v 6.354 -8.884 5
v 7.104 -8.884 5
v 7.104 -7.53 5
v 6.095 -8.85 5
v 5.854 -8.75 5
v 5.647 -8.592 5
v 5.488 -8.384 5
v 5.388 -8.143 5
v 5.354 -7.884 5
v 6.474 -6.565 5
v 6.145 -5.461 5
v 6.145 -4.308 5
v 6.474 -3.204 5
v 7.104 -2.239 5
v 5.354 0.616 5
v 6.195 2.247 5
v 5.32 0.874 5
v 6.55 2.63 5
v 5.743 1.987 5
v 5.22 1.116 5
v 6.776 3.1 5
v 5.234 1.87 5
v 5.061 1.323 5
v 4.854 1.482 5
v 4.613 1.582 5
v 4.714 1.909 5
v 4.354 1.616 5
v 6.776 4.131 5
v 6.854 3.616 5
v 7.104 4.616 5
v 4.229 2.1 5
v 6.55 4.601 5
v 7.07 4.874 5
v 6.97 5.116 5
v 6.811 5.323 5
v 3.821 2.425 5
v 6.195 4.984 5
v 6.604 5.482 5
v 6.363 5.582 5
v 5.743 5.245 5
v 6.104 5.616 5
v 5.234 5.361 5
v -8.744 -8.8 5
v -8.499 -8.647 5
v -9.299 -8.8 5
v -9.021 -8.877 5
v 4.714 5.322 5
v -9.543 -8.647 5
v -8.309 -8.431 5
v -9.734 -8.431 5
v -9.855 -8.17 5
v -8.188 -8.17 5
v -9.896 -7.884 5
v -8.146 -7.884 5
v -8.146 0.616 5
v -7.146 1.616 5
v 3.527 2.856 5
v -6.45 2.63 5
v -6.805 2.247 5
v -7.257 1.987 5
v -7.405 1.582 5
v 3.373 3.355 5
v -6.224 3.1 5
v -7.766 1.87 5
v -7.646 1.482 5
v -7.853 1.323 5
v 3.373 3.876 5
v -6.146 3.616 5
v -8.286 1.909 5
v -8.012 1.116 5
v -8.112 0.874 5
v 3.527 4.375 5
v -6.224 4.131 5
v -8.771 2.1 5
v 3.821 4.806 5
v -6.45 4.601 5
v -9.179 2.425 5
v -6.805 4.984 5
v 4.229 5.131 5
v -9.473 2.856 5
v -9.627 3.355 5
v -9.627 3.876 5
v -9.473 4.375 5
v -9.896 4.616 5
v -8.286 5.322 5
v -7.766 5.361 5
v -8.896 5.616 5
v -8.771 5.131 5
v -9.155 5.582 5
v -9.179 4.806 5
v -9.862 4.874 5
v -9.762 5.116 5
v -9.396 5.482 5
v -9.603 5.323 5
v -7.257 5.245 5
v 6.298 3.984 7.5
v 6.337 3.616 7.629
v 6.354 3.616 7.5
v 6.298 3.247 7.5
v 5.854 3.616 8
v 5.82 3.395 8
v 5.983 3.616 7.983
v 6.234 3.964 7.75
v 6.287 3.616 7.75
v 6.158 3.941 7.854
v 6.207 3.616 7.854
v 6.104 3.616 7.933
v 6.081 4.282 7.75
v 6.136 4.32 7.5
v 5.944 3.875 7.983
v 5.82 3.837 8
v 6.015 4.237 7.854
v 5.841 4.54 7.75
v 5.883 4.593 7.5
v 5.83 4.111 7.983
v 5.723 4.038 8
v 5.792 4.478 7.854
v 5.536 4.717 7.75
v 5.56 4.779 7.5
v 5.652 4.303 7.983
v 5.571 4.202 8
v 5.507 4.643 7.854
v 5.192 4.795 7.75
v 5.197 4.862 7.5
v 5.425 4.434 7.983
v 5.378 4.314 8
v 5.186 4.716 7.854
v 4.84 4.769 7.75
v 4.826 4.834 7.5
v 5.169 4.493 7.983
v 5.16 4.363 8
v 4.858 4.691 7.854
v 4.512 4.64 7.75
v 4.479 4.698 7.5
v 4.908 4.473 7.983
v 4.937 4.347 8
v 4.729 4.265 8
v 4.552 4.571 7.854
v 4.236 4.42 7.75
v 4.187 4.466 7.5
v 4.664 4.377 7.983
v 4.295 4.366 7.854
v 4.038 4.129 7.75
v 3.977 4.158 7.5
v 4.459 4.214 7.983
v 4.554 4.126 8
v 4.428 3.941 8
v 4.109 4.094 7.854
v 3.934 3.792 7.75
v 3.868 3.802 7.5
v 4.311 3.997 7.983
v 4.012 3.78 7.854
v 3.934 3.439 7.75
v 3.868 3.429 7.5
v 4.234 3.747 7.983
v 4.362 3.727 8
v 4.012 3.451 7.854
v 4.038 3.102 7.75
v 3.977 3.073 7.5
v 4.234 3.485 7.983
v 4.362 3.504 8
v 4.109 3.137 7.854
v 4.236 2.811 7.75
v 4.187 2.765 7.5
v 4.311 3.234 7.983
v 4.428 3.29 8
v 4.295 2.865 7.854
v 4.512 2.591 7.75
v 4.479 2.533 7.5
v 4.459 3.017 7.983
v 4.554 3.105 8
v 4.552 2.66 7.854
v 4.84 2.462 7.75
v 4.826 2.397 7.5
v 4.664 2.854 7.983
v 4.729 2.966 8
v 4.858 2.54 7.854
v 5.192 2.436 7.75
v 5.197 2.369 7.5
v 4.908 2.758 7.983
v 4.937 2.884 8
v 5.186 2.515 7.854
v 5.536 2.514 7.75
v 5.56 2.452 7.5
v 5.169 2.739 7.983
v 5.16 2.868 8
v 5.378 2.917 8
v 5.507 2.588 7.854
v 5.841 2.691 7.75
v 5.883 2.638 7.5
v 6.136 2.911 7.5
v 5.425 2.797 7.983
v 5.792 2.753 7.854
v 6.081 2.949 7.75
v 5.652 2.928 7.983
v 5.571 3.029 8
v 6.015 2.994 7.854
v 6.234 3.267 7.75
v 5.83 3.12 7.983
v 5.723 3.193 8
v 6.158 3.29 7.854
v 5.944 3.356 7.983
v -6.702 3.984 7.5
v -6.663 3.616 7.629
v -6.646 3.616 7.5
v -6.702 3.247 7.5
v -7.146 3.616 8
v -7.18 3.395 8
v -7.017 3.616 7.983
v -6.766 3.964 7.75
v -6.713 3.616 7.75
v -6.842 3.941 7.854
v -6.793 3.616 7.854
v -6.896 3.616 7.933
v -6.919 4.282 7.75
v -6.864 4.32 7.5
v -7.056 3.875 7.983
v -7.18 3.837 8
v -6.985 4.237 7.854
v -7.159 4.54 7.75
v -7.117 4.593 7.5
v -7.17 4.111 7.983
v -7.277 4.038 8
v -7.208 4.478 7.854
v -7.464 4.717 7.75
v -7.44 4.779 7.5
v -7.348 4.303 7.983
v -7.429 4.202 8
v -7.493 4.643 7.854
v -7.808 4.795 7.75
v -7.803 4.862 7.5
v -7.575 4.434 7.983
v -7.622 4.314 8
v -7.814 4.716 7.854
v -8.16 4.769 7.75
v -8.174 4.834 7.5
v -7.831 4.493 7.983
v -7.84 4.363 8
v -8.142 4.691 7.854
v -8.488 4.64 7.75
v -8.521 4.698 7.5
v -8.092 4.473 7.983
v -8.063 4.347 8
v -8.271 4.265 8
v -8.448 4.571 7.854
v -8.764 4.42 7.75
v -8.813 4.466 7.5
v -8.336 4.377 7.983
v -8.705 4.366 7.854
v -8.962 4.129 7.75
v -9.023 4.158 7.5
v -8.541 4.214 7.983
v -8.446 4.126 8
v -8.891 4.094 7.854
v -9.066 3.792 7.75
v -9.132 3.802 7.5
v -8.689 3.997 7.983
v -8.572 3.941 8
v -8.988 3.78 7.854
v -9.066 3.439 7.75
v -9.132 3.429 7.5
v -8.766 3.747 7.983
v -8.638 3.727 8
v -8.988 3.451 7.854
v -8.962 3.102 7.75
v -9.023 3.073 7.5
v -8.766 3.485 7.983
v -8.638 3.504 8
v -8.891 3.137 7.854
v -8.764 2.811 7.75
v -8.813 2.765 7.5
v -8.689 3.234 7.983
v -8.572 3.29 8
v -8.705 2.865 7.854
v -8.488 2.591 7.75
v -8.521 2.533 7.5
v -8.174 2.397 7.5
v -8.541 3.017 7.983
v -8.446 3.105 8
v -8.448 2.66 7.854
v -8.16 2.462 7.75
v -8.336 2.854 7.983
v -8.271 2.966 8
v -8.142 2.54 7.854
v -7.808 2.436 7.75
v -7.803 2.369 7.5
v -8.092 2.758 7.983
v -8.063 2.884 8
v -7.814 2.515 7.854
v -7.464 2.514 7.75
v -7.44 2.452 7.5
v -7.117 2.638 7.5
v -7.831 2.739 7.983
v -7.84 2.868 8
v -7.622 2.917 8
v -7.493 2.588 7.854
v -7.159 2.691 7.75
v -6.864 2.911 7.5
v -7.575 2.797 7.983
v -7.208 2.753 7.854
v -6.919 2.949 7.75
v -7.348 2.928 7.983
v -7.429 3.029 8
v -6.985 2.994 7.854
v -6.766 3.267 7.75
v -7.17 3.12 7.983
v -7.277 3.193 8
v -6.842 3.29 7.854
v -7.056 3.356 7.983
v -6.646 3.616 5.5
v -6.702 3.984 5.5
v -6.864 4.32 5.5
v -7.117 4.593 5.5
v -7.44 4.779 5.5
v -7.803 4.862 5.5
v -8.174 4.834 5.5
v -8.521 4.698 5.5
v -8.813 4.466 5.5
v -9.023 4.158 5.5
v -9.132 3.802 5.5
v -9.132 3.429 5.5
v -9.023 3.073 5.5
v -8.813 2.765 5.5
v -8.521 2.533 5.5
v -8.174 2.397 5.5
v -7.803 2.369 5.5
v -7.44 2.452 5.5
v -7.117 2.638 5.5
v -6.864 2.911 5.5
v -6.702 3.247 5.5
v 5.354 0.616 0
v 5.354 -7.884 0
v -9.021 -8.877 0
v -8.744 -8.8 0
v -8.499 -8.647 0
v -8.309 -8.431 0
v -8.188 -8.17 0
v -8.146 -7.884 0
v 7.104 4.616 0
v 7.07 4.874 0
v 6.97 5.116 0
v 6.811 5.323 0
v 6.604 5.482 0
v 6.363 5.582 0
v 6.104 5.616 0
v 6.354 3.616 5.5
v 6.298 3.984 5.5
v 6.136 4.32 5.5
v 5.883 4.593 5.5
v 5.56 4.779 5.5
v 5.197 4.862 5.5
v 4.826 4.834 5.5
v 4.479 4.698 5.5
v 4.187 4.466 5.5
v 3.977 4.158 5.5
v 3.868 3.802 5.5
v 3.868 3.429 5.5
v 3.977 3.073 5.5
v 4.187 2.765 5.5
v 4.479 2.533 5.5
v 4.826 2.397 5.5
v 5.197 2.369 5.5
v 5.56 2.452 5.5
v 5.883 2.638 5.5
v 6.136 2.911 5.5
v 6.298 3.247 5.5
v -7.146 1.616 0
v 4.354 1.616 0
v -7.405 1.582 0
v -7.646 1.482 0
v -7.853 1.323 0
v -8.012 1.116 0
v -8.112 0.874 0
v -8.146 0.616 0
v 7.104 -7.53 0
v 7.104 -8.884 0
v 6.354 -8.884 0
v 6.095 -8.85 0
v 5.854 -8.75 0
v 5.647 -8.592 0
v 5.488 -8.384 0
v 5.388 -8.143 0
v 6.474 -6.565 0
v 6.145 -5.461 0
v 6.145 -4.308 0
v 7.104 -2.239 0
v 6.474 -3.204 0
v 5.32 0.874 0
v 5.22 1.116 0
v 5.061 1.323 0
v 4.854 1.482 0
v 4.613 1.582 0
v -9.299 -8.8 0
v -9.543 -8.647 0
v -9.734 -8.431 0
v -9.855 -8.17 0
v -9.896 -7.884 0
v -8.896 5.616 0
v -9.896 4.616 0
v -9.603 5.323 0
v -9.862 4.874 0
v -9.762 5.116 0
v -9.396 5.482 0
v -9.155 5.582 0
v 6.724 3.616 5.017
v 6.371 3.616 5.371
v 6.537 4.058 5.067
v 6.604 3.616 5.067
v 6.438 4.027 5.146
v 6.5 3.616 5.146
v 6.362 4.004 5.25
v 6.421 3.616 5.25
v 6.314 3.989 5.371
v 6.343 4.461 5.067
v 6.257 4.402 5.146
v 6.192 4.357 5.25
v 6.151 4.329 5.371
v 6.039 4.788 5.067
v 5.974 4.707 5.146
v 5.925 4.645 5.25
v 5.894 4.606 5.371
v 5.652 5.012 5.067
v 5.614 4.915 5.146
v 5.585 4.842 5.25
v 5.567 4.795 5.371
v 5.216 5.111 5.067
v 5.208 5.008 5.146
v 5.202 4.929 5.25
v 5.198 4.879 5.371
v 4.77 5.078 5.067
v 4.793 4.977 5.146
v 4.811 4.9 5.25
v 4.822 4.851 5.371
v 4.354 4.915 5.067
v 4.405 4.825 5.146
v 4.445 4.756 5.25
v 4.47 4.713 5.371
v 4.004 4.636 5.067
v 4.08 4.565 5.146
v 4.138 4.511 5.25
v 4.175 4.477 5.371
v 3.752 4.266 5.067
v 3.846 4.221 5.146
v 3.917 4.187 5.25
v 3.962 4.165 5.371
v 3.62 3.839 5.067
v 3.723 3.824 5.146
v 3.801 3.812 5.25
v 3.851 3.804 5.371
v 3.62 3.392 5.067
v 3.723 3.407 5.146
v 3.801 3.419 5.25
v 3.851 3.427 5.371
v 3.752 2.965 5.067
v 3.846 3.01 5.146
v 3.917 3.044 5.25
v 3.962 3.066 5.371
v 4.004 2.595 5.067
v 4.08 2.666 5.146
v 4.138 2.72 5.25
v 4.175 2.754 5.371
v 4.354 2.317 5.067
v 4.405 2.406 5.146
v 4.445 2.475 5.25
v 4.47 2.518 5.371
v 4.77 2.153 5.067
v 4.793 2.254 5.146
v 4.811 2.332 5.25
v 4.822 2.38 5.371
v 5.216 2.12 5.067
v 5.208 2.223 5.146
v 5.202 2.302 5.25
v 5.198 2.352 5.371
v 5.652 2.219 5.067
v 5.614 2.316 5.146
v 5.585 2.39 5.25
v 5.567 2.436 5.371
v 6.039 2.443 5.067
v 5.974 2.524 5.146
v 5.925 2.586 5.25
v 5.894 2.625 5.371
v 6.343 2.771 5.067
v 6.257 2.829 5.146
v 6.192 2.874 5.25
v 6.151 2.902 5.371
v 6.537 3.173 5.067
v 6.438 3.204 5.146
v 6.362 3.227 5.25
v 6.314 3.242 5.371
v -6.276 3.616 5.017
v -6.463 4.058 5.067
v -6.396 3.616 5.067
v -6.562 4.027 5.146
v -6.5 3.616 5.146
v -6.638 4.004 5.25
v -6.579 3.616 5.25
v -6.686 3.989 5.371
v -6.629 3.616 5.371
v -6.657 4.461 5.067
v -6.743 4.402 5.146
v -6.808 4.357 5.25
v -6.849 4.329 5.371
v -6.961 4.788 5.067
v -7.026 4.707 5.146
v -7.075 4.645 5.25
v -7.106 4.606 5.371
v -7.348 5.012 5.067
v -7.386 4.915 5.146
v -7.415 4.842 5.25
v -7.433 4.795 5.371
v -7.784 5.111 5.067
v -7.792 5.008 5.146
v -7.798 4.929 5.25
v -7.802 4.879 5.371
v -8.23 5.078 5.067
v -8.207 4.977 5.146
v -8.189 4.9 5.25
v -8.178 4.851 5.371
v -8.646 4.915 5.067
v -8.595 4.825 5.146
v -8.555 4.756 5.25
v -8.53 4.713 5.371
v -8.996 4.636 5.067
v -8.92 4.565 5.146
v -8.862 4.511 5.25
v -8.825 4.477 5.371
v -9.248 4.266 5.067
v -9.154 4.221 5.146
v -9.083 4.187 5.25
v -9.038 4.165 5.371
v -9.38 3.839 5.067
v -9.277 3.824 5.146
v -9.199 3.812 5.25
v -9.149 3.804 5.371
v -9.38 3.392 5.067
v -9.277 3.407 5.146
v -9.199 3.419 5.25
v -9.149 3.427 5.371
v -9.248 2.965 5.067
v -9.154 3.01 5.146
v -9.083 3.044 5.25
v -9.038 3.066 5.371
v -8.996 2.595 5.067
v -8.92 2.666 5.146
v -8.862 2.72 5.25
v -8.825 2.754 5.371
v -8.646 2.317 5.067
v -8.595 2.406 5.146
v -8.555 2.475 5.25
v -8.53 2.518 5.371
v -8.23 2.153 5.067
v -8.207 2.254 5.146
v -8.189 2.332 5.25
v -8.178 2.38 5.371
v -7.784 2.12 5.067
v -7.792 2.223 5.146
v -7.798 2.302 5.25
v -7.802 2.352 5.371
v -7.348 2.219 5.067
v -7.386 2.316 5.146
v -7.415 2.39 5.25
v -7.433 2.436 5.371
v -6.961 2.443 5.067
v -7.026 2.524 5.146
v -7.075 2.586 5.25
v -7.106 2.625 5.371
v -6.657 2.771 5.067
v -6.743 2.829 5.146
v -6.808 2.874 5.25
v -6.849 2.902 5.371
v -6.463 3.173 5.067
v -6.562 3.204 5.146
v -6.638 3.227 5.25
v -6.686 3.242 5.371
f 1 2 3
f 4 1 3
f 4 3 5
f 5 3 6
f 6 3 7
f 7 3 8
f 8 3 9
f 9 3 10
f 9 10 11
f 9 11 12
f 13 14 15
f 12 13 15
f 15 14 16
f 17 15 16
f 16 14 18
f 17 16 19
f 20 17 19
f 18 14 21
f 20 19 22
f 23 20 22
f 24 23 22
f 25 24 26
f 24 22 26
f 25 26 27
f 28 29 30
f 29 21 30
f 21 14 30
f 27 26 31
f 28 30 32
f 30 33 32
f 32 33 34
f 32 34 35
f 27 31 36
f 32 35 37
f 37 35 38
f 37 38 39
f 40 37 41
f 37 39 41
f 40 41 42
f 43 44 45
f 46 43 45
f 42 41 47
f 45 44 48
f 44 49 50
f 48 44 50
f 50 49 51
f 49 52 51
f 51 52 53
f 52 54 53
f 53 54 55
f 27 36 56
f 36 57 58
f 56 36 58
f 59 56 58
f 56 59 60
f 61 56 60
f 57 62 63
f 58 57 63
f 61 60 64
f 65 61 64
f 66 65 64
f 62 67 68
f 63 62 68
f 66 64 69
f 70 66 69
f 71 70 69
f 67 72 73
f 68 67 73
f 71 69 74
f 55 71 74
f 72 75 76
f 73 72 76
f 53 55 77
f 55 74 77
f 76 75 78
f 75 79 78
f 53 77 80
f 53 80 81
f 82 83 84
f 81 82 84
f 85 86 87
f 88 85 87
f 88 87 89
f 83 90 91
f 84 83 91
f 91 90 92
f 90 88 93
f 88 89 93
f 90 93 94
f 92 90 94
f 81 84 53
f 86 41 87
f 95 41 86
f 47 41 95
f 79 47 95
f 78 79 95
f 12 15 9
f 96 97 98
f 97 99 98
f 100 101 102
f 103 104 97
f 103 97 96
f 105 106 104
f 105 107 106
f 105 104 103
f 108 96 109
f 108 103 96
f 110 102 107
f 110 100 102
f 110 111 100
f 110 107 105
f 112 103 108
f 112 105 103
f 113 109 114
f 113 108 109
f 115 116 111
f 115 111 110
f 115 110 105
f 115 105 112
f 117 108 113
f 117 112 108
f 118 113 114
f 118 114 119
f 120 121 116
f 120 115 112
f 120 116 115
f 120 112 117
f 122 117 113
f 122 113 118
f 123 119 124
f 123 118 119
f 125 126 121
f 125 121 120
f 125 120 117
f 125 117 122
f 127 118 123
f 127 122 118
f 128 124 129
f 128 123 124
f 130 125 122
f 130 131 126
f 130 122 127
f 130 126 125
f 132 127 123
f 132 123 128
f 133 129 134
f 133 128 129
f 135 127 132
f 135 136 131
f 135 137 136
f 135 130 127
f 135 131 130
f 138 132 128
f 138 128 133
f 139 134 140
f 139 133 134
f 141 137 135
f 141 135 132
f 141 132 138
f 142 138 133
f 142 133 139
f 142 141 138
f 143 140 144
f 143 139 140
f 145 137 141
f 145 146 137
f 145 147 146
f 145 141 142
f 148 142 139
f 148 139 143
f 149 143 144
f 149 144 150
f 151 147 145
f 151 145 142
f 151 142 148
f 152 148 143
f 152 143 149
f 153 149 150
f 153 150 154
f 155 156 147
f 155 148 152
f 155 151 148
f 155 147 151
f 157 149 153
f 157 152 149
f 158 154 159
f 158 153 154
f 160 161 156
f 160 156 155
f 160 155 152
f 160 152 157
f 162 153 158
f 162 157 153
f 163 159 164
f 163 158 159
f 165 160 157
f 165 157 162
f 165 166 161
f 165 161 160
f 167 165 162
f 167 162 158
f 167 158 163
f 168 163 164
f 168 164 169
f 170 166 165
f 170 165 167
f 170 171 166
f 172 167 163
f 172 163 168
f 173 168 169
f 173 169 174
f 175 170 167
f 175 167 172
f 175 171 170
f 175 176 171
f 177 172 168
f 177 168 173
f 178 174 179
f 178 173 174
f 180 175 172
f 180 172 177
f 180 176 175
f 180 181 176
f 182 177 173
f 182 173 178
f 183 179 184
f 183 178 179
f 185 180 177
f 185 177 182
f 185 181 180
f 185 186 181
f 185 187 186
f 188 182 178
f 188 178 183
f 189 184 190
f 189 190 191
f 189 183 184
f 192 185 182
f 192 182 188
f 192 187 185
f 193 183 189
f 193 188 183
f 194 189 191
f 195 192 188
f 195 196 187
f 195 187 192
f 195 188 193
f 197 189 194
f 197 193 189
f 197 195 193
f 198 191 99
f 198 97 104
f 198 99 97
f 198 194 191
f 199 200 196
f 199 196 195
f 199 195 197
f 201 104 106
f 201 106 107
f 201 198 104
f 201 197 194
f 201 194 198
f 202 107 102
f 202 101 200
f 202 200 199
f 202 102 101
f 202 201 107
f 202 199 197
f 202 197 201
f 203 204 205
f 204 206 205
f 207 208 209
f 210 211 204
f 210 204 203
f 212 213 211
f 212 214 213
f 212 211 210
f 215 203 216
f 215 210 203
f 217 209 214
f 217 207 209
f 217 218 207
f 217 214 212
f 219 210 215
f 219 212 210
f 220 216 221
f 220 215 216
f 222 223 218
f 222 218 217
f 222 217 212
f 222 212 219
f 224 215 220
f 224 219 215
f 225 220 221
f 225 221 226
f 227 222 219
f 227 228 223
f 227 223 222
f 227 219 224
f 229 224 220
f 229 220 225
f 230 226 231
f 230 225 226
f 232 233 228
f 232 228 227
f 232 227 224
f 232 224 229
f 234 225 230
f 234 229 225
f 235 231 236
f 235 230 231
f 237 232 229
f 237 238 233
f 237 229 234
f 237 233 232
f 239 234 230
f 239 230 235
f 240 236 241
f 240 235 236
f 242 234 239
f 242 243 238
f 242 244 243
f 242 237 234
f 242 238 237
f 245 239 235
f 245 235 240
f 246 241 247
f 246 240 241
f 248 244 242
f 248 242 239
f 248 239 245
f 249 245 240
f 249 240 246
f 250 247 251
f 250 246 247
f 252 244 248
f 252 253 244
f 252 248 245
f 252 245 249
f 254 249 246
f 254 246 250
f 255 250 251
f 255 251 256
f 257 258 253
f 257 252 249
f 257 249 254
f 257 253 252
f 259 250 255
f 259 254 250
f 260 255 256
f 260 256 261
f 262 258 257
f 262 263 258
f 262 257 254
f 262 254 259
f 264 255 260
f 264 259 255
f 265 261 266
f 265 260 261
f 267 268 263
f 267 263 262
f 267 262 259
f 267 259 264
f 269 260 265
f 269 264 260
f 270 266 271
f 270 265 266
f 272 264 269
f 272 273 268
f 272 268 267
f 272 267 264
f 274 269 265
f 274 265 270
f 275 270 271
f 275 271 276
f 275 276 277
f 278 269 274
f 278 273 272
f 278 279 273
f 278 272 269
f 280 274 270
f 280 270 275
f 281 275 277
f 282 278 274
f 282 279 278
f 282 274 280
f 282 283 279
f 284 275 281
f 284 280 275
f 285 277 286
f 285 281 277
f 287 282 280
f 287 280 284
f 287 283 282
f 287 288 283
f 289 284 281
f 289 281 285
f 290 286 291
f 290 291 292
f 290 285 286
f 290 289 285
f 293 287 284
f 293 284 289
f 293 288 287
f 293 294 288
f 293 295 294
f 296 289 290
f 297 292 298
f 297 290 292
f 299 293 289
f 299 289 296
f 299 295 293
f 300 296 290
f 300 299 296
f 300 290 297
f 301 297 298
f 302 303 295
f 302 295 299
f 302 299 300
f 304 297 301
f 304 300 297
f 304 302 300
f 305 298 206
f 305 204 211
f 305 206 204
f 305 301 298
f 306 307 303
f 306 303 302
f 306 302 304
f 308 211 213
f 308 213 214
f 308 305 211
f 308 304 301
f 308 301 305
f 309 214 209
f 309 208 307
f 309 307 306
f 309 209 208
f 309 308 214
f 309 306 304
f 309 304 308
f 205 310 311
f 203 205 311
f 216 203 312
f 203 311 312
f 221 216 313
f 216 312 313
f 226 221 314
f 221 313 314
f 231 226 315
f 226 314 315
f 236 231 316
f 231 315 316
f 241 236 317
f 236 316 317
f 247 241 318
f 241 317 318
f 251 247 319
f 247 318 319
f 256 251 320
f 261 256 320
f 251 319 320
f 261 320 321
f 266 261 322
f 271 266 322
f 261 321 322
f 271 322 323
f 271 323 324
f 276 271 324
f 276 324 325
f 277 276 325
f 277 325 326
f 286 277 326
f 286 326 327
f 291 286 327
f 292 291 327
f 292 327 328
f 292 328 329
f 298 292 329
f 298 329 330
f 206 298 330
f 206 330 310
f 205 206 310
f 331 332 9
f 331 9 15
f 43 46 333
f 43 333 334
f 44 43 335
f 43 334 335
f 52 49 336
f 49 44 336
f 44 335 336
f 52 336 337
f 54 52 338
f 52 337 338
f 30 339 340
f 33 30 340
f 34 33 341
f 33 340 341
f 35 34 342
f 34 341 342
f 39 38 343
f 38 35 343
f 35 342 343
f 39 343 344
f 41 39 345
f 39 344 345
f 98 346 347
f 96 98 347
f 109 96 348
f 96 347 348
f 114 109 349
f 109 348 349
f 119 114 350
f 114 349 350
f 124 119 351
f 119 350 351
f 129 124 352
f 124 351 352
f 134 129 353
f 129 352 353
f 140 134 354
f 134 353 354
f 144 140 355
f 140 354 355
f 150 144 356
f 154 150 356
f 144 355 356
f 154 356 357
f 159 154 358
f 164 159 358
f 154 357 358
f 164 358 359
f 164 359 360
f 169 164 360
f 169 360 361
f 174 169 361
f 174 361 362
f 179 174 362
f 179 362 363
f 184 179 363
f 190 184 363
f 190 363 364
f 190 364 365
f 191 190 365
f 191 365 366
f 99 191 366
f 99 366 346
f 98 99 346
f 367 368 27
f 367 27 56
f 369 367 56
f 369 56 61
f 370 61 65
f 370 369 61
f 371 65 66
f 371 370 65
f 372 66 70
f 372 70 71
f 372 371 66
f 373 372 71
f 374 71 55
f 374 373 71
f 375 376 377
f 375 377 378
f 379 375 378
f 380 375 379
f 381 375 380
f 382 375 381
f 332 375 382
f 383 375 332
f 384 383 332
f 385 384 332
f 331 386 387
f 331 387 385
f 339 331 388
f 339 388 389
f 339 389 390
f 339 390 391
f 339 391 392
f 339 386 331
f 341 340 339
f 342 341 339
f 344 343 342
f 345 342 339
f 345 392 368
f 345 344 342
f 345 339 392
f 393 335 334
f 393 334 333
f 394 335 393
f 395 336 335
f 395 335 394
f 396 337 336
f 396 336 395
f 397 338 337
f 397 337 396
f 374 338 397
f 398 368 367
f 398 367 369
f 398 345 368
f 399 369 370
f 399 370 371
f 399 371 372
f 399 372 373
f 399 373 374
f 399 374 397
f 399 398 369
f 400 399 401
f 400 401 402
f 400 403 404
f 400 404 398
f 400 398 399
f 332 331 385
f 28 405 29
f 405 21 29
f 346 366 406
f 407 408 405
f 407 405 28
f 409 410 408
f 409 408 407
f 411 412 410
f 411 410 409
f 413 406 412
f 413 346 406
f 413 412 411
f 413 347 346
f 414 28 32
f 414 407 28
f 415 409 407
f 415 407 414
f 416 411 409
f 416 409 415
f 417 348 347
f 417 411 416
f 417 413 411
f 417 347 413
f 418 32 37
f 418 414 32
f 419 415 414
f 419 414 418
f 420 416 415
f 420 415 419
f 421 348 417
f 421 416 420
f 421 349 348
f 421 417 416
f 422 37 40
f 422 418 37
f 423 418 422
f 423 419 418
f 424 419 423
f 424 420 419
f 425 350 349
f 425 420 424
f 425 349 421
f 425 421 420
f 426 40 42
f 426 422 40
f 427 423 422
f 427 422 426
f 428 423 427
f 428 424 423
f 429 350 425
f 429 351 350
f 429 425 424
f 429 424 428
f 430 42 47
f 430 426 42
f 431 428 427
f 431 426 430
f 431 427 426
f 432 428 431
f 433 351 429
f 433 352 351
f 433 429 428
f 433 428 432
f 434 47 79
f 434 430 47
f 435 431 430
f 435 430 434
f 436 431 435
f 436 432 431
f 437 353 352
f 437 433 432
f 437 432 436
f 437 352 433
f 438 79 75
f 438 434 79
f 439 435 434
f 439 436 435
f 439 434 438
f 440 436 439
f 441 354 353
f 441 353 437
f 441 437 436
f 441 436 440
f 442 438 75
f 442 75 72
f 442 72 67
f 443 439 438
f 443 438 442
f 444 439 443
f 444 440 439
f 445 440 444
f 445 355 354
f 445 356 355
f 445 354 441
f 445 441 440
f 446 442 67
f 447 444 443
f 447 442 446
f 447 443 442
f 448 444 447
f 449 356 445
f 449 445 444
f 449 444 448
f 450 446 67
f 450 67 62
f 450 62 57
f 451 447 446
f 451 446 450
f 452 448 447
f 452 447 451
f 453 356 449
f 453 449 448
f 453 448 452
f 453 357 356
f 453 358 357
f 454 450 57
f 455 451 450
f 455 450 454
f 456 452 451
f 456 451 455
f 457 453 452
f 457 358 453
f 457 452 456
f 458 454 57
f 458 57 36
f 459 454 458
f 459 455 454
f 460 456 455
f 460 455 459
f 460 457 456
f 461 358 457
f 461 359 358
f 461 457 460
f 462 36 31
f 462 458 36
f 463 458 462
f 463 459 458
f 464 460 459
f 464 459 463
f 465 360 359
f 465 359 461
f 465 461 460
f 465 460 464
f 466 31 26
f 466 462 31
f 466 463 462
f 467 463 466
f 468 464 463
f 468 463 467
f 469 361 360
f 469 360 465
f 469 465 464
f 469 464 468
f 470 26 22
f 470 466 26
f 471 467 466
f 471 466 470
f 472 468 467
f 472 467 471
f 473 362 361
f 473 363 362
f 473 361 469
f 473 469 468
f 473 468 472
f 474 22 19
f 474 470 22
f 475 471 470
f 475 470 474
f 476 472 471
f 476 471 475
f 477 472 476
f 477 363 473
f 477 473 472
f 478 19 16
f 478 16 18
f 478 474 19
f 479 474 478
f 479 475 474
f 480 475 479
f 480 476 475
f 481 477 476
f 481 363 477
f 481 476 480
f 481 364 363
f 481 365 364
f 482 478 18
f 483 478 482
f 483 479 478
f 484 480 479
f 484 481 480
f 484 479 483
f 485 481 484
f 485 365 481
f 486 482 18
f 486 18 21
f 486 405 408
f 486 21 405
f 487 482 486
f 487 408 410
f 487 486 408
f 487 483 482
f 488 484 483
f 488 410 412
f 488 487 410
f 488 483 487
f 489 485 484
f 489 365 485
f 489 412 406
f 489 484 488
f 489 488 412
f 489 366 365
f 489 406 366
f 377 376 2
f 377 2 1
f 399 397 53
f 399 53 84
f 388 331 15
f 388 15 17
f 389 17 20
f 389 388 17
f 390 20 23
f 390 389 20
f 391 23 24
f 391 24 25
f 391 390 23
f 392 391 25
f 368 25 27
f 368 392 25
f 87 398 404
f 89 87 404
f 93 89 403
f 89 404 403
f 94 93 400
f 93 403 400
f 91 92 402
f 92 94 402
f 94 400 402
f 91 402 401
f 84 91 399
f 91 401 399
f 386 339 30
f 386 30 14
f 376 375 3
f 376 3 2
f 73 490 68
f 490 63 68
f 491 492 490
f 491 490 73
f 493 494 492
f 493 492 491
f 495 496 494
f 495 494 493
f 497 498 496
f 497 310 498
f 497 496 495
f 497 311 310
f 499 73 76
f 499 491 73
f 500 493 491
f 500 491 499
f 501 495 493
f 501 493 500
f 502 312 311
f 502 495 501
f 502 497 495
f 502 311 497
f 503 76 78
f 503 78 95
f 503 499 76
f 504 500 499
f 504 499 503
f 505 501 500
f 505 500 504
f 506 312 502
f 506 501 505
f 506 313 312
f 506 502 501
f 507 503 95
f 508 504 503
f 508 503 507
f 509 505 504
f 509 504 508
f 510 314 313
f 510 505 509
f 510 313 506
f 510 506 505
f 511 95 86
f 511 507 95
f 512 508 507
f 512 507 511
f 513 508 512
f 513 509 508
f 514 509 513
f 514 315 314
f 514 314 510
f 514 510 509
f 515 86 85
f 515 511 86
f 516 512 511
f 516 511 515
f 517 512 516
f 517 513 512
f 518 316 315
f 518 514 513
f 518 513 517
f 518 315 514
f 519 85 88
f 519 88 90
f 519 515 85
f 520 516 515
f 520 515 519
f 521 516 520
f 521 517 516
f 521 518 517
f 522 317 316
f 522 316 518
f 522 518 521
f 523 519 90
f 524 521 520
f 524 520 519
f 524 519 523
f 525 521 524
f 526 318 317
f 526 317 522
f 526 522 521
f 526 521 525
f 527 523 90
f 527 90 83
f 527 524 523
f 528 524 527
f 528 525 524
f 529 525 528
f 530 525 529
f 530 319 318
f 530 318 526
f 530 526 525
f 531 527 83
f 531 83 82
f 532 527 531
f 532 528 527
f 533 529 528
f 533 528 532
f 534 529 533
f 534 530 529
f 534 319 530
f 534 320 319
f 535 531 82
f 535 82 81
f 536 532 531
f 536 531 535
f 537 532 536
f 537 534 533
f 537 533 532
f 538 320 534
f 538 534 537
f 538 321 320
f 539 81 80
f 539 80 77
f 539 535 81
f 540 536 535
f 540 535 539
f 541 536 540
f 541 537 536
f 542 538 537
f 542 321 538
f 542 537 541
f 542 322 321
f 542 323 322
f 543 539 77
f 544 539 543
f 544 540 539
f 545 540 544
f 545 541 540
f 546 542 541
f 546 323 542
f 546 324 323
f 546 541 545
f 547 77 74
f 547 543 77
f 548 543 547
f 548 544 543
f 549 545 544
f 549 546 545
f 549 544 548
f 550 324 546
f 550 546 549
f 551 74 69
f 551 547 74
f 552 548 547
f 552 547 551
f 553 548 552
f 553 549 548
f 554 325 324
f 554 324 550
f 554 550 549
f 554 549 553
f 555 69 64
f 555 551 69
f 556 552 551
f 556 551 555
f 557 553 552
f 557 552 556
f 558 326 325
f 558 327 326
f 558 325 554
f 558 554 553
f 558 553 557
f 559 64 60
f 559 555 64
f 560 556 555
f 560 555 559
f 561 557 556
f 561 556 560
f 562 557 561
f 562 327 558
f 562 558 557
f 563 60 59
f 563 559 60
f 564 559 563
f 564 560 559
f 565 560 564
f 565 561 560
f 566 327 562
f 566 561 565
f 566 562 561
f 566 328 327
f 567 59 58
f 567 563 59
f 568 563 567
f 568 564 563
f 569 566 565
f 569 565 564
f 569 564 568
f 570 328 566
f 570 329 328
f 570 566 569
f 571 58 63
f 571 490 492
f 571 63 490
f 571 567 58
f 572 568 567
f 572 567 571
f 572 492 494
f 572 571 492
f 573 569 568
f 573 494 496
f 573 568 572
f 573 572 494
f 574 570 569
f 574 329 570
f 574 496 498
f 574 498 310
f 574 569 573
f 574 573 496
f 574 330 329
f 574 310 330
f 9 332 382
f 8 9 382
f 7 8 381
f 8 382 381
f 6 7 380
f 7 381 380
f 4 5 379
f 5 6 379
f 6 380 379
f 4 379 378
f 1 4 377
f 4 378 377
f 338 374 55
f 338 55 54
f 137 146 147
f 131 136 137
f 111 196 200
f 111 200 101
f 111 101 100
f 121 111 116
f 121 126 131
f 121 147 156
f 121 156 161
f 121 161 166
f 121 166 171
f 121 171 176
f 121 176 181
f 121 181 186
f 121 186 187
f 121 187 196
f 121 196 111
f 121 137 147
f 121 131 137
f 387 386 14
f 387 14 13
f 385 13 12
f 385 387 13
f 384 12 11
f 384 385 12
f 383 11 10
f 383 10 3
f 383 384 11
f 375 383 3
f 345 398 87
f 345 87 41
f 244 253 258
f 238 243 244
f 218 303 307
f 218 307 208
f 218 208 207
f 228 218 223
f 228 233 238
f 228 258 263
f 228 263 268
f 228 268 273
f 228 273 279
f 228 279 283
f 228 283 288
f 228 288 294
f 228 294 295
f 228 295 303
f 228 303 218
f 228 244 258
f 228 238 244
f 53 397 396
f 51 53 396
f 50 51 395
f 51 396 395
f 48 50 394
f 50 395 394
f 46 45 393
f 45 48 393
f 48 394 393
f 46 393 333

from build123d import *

# Parameters (mm, degrees)
SKETCH1_R                = 1.25
BOSS_EXTRUDE1_DEPTH      = 5
BOSS_EXTRUDE2_DEPTH      = 3
BOSS_EXTRUDE2_DEPTH_BACK = 5
SKETCH2_R                = 1.25
FILLET1_R                = 1
FILLET2_R                = 0.5


with BuildPart() as part:
    # Sketch1 → Boss-Extrude1 (new body)
    with BuildSketch(Plane.XY):
        with BuildLine():
            Line((-8.146317829, 1.615581395), (-8.146317829, -8.884418605))
            Line((-8.146317829, -8.884418605), (-9.896317829, -8.884418605))
            Line((-9.896317829, -8.884418605), (-9.896317829, 5.615581395))
            Line((-9.896317829, 5.615581395), (7.103682171, 5.615581395))
            Line((7.103682171, 5.615581395), (7.103682171, -2.238667294))
            ThreePointArc((7.103682171, -2.238667294), (6.103682171, -4.884418605), (7.103682171, -7.530169916))
            Line((7.103682171, -7.530169916), (7.103682171, -8.884418605))
            Line((7.103682171, -8.884418605), (5.353682171, -8.884418605))
            Line((5.353682171, -8.884418605), (5.353682171, 1.615581395))
            Line((5.353682171, 1.615581395), (-8.146317829, 1.615581395))
        make_face()
        with Locations((-7.896317829, 3.615581395)):
            Circle(SKETCH1_R, mode=Mode.SUBTRACT)
        with Locations((5.103682171, 3.615581395)):
            Circle(SKETCH1_R, mode=Mode.SUBTRACT)
    extrude(amount=BOSS_EXTRUDE1_DEPTH)

    # Sketch2 → Boss-Extrude2 (add, two sides: drawn at the far end of the back side and taken through both)
    with BuildSketch(Plane.XY.offset(5).offset(-BOSS_EXTRUDE2_DEPTH_BACK)):
        with Locations((-7.896317829, 3.615581395)):
            Circle(SKETCH2_R)
        with Locations((5.103682171, 3.615581395)):
            Circle(SKETCH2_R)
    extrude(amount=BOSS_EXTRUDE2_DEPTH + BOSS_EXTRUDE2_DEPTH_BACK)

    # Fillet1
    # the kernel refuses this fillet: 1 mm, written as the material it adds along each edge
    with BuildSketch(Plane(origin=(-8.146317829, 1.615581395, 0), x_dir=(1, 0, 0), z_dir=(0, 0, 1)), Plane(origin=(5.353682171, 1.615581395, 0), x_dir=(0, -1, 0), z_dir=(0, 0, 1))) as fillet1_piece_1:
        with BuildLine():
            CenterArc((FILLET1_R, -FILLET1_R), FILLET1_R, 90, 90)
            Line((0, -FILLET1_R), (0, 0))
            Line((0, 0), (FILLET1_R, 0))
        make_face()
    extrude(amount=5)
    # the kernel refuses this fillet: 1 mm, written as the material it takes off along each edge
    with BuildSketch(Plane(origin=(-8.146317829, -8.884418605, -2.5), x_dir=(0, 1, 0), z_dir=(0, 0, 1)), Plane(origin=(-9.896317829, -8.884418605, -2.5), x_dir=(1, 0, 0), z_dir=(0, 0, 1)), Plane(origin=(-9.896317829, 5.615581395, -2.5), x_dir=(0, -1, 0), z_dir=(0, 0, 1)), Plane(origin=(5.353682171, -8.884418605, -2.5), x_dir=(1, 0, 0), z_dir=(0, 0, 1))) as fillet1_2_piece_1:
        with BuildLine():
            CenterArc((FILLET1_R, FILLET1_R), FILLET1_R, 180, 90)
            Line((0, FILLET1_R), (0, 0))
            Line((0, 0), (FILLET1_R, 0))
        make_face()
    extrude(amount=10, mode=Mode.SUBTRACT)
    with BuildSketch(Plane(origin=(7.103682171, 5.615581395, -2.5), x_dir=(0, -1, 0), z_dir=(0, 0, 1))) as fillet1_2_piece_2:
        with BuildLine():
            CenterArc((FILLET1_R, -FILLET1_R), FILLET1_R, 90, 90)
            Line((0, -FILLET1_R), (0, 0))
            Line((0, 0), (FILLET1_R, 0))
        make_face()
    extrude(amount=10, mode=Mode.SUBTRACT)

    # Fillet2
    fillet2_edges = [part.edges().sort_by_distance(p)[0] for p in [
        (-9.146317829, 3.615581395, 5),
        (3.853682171, 3.615581395, 5),
        (-9.146317829, 3.615581395, 8),
        (3.853682171, 3.615581395, 8),
    ]]
    fillet(fillet2_edges, radius=FILLET2_R)


solid = part.part
